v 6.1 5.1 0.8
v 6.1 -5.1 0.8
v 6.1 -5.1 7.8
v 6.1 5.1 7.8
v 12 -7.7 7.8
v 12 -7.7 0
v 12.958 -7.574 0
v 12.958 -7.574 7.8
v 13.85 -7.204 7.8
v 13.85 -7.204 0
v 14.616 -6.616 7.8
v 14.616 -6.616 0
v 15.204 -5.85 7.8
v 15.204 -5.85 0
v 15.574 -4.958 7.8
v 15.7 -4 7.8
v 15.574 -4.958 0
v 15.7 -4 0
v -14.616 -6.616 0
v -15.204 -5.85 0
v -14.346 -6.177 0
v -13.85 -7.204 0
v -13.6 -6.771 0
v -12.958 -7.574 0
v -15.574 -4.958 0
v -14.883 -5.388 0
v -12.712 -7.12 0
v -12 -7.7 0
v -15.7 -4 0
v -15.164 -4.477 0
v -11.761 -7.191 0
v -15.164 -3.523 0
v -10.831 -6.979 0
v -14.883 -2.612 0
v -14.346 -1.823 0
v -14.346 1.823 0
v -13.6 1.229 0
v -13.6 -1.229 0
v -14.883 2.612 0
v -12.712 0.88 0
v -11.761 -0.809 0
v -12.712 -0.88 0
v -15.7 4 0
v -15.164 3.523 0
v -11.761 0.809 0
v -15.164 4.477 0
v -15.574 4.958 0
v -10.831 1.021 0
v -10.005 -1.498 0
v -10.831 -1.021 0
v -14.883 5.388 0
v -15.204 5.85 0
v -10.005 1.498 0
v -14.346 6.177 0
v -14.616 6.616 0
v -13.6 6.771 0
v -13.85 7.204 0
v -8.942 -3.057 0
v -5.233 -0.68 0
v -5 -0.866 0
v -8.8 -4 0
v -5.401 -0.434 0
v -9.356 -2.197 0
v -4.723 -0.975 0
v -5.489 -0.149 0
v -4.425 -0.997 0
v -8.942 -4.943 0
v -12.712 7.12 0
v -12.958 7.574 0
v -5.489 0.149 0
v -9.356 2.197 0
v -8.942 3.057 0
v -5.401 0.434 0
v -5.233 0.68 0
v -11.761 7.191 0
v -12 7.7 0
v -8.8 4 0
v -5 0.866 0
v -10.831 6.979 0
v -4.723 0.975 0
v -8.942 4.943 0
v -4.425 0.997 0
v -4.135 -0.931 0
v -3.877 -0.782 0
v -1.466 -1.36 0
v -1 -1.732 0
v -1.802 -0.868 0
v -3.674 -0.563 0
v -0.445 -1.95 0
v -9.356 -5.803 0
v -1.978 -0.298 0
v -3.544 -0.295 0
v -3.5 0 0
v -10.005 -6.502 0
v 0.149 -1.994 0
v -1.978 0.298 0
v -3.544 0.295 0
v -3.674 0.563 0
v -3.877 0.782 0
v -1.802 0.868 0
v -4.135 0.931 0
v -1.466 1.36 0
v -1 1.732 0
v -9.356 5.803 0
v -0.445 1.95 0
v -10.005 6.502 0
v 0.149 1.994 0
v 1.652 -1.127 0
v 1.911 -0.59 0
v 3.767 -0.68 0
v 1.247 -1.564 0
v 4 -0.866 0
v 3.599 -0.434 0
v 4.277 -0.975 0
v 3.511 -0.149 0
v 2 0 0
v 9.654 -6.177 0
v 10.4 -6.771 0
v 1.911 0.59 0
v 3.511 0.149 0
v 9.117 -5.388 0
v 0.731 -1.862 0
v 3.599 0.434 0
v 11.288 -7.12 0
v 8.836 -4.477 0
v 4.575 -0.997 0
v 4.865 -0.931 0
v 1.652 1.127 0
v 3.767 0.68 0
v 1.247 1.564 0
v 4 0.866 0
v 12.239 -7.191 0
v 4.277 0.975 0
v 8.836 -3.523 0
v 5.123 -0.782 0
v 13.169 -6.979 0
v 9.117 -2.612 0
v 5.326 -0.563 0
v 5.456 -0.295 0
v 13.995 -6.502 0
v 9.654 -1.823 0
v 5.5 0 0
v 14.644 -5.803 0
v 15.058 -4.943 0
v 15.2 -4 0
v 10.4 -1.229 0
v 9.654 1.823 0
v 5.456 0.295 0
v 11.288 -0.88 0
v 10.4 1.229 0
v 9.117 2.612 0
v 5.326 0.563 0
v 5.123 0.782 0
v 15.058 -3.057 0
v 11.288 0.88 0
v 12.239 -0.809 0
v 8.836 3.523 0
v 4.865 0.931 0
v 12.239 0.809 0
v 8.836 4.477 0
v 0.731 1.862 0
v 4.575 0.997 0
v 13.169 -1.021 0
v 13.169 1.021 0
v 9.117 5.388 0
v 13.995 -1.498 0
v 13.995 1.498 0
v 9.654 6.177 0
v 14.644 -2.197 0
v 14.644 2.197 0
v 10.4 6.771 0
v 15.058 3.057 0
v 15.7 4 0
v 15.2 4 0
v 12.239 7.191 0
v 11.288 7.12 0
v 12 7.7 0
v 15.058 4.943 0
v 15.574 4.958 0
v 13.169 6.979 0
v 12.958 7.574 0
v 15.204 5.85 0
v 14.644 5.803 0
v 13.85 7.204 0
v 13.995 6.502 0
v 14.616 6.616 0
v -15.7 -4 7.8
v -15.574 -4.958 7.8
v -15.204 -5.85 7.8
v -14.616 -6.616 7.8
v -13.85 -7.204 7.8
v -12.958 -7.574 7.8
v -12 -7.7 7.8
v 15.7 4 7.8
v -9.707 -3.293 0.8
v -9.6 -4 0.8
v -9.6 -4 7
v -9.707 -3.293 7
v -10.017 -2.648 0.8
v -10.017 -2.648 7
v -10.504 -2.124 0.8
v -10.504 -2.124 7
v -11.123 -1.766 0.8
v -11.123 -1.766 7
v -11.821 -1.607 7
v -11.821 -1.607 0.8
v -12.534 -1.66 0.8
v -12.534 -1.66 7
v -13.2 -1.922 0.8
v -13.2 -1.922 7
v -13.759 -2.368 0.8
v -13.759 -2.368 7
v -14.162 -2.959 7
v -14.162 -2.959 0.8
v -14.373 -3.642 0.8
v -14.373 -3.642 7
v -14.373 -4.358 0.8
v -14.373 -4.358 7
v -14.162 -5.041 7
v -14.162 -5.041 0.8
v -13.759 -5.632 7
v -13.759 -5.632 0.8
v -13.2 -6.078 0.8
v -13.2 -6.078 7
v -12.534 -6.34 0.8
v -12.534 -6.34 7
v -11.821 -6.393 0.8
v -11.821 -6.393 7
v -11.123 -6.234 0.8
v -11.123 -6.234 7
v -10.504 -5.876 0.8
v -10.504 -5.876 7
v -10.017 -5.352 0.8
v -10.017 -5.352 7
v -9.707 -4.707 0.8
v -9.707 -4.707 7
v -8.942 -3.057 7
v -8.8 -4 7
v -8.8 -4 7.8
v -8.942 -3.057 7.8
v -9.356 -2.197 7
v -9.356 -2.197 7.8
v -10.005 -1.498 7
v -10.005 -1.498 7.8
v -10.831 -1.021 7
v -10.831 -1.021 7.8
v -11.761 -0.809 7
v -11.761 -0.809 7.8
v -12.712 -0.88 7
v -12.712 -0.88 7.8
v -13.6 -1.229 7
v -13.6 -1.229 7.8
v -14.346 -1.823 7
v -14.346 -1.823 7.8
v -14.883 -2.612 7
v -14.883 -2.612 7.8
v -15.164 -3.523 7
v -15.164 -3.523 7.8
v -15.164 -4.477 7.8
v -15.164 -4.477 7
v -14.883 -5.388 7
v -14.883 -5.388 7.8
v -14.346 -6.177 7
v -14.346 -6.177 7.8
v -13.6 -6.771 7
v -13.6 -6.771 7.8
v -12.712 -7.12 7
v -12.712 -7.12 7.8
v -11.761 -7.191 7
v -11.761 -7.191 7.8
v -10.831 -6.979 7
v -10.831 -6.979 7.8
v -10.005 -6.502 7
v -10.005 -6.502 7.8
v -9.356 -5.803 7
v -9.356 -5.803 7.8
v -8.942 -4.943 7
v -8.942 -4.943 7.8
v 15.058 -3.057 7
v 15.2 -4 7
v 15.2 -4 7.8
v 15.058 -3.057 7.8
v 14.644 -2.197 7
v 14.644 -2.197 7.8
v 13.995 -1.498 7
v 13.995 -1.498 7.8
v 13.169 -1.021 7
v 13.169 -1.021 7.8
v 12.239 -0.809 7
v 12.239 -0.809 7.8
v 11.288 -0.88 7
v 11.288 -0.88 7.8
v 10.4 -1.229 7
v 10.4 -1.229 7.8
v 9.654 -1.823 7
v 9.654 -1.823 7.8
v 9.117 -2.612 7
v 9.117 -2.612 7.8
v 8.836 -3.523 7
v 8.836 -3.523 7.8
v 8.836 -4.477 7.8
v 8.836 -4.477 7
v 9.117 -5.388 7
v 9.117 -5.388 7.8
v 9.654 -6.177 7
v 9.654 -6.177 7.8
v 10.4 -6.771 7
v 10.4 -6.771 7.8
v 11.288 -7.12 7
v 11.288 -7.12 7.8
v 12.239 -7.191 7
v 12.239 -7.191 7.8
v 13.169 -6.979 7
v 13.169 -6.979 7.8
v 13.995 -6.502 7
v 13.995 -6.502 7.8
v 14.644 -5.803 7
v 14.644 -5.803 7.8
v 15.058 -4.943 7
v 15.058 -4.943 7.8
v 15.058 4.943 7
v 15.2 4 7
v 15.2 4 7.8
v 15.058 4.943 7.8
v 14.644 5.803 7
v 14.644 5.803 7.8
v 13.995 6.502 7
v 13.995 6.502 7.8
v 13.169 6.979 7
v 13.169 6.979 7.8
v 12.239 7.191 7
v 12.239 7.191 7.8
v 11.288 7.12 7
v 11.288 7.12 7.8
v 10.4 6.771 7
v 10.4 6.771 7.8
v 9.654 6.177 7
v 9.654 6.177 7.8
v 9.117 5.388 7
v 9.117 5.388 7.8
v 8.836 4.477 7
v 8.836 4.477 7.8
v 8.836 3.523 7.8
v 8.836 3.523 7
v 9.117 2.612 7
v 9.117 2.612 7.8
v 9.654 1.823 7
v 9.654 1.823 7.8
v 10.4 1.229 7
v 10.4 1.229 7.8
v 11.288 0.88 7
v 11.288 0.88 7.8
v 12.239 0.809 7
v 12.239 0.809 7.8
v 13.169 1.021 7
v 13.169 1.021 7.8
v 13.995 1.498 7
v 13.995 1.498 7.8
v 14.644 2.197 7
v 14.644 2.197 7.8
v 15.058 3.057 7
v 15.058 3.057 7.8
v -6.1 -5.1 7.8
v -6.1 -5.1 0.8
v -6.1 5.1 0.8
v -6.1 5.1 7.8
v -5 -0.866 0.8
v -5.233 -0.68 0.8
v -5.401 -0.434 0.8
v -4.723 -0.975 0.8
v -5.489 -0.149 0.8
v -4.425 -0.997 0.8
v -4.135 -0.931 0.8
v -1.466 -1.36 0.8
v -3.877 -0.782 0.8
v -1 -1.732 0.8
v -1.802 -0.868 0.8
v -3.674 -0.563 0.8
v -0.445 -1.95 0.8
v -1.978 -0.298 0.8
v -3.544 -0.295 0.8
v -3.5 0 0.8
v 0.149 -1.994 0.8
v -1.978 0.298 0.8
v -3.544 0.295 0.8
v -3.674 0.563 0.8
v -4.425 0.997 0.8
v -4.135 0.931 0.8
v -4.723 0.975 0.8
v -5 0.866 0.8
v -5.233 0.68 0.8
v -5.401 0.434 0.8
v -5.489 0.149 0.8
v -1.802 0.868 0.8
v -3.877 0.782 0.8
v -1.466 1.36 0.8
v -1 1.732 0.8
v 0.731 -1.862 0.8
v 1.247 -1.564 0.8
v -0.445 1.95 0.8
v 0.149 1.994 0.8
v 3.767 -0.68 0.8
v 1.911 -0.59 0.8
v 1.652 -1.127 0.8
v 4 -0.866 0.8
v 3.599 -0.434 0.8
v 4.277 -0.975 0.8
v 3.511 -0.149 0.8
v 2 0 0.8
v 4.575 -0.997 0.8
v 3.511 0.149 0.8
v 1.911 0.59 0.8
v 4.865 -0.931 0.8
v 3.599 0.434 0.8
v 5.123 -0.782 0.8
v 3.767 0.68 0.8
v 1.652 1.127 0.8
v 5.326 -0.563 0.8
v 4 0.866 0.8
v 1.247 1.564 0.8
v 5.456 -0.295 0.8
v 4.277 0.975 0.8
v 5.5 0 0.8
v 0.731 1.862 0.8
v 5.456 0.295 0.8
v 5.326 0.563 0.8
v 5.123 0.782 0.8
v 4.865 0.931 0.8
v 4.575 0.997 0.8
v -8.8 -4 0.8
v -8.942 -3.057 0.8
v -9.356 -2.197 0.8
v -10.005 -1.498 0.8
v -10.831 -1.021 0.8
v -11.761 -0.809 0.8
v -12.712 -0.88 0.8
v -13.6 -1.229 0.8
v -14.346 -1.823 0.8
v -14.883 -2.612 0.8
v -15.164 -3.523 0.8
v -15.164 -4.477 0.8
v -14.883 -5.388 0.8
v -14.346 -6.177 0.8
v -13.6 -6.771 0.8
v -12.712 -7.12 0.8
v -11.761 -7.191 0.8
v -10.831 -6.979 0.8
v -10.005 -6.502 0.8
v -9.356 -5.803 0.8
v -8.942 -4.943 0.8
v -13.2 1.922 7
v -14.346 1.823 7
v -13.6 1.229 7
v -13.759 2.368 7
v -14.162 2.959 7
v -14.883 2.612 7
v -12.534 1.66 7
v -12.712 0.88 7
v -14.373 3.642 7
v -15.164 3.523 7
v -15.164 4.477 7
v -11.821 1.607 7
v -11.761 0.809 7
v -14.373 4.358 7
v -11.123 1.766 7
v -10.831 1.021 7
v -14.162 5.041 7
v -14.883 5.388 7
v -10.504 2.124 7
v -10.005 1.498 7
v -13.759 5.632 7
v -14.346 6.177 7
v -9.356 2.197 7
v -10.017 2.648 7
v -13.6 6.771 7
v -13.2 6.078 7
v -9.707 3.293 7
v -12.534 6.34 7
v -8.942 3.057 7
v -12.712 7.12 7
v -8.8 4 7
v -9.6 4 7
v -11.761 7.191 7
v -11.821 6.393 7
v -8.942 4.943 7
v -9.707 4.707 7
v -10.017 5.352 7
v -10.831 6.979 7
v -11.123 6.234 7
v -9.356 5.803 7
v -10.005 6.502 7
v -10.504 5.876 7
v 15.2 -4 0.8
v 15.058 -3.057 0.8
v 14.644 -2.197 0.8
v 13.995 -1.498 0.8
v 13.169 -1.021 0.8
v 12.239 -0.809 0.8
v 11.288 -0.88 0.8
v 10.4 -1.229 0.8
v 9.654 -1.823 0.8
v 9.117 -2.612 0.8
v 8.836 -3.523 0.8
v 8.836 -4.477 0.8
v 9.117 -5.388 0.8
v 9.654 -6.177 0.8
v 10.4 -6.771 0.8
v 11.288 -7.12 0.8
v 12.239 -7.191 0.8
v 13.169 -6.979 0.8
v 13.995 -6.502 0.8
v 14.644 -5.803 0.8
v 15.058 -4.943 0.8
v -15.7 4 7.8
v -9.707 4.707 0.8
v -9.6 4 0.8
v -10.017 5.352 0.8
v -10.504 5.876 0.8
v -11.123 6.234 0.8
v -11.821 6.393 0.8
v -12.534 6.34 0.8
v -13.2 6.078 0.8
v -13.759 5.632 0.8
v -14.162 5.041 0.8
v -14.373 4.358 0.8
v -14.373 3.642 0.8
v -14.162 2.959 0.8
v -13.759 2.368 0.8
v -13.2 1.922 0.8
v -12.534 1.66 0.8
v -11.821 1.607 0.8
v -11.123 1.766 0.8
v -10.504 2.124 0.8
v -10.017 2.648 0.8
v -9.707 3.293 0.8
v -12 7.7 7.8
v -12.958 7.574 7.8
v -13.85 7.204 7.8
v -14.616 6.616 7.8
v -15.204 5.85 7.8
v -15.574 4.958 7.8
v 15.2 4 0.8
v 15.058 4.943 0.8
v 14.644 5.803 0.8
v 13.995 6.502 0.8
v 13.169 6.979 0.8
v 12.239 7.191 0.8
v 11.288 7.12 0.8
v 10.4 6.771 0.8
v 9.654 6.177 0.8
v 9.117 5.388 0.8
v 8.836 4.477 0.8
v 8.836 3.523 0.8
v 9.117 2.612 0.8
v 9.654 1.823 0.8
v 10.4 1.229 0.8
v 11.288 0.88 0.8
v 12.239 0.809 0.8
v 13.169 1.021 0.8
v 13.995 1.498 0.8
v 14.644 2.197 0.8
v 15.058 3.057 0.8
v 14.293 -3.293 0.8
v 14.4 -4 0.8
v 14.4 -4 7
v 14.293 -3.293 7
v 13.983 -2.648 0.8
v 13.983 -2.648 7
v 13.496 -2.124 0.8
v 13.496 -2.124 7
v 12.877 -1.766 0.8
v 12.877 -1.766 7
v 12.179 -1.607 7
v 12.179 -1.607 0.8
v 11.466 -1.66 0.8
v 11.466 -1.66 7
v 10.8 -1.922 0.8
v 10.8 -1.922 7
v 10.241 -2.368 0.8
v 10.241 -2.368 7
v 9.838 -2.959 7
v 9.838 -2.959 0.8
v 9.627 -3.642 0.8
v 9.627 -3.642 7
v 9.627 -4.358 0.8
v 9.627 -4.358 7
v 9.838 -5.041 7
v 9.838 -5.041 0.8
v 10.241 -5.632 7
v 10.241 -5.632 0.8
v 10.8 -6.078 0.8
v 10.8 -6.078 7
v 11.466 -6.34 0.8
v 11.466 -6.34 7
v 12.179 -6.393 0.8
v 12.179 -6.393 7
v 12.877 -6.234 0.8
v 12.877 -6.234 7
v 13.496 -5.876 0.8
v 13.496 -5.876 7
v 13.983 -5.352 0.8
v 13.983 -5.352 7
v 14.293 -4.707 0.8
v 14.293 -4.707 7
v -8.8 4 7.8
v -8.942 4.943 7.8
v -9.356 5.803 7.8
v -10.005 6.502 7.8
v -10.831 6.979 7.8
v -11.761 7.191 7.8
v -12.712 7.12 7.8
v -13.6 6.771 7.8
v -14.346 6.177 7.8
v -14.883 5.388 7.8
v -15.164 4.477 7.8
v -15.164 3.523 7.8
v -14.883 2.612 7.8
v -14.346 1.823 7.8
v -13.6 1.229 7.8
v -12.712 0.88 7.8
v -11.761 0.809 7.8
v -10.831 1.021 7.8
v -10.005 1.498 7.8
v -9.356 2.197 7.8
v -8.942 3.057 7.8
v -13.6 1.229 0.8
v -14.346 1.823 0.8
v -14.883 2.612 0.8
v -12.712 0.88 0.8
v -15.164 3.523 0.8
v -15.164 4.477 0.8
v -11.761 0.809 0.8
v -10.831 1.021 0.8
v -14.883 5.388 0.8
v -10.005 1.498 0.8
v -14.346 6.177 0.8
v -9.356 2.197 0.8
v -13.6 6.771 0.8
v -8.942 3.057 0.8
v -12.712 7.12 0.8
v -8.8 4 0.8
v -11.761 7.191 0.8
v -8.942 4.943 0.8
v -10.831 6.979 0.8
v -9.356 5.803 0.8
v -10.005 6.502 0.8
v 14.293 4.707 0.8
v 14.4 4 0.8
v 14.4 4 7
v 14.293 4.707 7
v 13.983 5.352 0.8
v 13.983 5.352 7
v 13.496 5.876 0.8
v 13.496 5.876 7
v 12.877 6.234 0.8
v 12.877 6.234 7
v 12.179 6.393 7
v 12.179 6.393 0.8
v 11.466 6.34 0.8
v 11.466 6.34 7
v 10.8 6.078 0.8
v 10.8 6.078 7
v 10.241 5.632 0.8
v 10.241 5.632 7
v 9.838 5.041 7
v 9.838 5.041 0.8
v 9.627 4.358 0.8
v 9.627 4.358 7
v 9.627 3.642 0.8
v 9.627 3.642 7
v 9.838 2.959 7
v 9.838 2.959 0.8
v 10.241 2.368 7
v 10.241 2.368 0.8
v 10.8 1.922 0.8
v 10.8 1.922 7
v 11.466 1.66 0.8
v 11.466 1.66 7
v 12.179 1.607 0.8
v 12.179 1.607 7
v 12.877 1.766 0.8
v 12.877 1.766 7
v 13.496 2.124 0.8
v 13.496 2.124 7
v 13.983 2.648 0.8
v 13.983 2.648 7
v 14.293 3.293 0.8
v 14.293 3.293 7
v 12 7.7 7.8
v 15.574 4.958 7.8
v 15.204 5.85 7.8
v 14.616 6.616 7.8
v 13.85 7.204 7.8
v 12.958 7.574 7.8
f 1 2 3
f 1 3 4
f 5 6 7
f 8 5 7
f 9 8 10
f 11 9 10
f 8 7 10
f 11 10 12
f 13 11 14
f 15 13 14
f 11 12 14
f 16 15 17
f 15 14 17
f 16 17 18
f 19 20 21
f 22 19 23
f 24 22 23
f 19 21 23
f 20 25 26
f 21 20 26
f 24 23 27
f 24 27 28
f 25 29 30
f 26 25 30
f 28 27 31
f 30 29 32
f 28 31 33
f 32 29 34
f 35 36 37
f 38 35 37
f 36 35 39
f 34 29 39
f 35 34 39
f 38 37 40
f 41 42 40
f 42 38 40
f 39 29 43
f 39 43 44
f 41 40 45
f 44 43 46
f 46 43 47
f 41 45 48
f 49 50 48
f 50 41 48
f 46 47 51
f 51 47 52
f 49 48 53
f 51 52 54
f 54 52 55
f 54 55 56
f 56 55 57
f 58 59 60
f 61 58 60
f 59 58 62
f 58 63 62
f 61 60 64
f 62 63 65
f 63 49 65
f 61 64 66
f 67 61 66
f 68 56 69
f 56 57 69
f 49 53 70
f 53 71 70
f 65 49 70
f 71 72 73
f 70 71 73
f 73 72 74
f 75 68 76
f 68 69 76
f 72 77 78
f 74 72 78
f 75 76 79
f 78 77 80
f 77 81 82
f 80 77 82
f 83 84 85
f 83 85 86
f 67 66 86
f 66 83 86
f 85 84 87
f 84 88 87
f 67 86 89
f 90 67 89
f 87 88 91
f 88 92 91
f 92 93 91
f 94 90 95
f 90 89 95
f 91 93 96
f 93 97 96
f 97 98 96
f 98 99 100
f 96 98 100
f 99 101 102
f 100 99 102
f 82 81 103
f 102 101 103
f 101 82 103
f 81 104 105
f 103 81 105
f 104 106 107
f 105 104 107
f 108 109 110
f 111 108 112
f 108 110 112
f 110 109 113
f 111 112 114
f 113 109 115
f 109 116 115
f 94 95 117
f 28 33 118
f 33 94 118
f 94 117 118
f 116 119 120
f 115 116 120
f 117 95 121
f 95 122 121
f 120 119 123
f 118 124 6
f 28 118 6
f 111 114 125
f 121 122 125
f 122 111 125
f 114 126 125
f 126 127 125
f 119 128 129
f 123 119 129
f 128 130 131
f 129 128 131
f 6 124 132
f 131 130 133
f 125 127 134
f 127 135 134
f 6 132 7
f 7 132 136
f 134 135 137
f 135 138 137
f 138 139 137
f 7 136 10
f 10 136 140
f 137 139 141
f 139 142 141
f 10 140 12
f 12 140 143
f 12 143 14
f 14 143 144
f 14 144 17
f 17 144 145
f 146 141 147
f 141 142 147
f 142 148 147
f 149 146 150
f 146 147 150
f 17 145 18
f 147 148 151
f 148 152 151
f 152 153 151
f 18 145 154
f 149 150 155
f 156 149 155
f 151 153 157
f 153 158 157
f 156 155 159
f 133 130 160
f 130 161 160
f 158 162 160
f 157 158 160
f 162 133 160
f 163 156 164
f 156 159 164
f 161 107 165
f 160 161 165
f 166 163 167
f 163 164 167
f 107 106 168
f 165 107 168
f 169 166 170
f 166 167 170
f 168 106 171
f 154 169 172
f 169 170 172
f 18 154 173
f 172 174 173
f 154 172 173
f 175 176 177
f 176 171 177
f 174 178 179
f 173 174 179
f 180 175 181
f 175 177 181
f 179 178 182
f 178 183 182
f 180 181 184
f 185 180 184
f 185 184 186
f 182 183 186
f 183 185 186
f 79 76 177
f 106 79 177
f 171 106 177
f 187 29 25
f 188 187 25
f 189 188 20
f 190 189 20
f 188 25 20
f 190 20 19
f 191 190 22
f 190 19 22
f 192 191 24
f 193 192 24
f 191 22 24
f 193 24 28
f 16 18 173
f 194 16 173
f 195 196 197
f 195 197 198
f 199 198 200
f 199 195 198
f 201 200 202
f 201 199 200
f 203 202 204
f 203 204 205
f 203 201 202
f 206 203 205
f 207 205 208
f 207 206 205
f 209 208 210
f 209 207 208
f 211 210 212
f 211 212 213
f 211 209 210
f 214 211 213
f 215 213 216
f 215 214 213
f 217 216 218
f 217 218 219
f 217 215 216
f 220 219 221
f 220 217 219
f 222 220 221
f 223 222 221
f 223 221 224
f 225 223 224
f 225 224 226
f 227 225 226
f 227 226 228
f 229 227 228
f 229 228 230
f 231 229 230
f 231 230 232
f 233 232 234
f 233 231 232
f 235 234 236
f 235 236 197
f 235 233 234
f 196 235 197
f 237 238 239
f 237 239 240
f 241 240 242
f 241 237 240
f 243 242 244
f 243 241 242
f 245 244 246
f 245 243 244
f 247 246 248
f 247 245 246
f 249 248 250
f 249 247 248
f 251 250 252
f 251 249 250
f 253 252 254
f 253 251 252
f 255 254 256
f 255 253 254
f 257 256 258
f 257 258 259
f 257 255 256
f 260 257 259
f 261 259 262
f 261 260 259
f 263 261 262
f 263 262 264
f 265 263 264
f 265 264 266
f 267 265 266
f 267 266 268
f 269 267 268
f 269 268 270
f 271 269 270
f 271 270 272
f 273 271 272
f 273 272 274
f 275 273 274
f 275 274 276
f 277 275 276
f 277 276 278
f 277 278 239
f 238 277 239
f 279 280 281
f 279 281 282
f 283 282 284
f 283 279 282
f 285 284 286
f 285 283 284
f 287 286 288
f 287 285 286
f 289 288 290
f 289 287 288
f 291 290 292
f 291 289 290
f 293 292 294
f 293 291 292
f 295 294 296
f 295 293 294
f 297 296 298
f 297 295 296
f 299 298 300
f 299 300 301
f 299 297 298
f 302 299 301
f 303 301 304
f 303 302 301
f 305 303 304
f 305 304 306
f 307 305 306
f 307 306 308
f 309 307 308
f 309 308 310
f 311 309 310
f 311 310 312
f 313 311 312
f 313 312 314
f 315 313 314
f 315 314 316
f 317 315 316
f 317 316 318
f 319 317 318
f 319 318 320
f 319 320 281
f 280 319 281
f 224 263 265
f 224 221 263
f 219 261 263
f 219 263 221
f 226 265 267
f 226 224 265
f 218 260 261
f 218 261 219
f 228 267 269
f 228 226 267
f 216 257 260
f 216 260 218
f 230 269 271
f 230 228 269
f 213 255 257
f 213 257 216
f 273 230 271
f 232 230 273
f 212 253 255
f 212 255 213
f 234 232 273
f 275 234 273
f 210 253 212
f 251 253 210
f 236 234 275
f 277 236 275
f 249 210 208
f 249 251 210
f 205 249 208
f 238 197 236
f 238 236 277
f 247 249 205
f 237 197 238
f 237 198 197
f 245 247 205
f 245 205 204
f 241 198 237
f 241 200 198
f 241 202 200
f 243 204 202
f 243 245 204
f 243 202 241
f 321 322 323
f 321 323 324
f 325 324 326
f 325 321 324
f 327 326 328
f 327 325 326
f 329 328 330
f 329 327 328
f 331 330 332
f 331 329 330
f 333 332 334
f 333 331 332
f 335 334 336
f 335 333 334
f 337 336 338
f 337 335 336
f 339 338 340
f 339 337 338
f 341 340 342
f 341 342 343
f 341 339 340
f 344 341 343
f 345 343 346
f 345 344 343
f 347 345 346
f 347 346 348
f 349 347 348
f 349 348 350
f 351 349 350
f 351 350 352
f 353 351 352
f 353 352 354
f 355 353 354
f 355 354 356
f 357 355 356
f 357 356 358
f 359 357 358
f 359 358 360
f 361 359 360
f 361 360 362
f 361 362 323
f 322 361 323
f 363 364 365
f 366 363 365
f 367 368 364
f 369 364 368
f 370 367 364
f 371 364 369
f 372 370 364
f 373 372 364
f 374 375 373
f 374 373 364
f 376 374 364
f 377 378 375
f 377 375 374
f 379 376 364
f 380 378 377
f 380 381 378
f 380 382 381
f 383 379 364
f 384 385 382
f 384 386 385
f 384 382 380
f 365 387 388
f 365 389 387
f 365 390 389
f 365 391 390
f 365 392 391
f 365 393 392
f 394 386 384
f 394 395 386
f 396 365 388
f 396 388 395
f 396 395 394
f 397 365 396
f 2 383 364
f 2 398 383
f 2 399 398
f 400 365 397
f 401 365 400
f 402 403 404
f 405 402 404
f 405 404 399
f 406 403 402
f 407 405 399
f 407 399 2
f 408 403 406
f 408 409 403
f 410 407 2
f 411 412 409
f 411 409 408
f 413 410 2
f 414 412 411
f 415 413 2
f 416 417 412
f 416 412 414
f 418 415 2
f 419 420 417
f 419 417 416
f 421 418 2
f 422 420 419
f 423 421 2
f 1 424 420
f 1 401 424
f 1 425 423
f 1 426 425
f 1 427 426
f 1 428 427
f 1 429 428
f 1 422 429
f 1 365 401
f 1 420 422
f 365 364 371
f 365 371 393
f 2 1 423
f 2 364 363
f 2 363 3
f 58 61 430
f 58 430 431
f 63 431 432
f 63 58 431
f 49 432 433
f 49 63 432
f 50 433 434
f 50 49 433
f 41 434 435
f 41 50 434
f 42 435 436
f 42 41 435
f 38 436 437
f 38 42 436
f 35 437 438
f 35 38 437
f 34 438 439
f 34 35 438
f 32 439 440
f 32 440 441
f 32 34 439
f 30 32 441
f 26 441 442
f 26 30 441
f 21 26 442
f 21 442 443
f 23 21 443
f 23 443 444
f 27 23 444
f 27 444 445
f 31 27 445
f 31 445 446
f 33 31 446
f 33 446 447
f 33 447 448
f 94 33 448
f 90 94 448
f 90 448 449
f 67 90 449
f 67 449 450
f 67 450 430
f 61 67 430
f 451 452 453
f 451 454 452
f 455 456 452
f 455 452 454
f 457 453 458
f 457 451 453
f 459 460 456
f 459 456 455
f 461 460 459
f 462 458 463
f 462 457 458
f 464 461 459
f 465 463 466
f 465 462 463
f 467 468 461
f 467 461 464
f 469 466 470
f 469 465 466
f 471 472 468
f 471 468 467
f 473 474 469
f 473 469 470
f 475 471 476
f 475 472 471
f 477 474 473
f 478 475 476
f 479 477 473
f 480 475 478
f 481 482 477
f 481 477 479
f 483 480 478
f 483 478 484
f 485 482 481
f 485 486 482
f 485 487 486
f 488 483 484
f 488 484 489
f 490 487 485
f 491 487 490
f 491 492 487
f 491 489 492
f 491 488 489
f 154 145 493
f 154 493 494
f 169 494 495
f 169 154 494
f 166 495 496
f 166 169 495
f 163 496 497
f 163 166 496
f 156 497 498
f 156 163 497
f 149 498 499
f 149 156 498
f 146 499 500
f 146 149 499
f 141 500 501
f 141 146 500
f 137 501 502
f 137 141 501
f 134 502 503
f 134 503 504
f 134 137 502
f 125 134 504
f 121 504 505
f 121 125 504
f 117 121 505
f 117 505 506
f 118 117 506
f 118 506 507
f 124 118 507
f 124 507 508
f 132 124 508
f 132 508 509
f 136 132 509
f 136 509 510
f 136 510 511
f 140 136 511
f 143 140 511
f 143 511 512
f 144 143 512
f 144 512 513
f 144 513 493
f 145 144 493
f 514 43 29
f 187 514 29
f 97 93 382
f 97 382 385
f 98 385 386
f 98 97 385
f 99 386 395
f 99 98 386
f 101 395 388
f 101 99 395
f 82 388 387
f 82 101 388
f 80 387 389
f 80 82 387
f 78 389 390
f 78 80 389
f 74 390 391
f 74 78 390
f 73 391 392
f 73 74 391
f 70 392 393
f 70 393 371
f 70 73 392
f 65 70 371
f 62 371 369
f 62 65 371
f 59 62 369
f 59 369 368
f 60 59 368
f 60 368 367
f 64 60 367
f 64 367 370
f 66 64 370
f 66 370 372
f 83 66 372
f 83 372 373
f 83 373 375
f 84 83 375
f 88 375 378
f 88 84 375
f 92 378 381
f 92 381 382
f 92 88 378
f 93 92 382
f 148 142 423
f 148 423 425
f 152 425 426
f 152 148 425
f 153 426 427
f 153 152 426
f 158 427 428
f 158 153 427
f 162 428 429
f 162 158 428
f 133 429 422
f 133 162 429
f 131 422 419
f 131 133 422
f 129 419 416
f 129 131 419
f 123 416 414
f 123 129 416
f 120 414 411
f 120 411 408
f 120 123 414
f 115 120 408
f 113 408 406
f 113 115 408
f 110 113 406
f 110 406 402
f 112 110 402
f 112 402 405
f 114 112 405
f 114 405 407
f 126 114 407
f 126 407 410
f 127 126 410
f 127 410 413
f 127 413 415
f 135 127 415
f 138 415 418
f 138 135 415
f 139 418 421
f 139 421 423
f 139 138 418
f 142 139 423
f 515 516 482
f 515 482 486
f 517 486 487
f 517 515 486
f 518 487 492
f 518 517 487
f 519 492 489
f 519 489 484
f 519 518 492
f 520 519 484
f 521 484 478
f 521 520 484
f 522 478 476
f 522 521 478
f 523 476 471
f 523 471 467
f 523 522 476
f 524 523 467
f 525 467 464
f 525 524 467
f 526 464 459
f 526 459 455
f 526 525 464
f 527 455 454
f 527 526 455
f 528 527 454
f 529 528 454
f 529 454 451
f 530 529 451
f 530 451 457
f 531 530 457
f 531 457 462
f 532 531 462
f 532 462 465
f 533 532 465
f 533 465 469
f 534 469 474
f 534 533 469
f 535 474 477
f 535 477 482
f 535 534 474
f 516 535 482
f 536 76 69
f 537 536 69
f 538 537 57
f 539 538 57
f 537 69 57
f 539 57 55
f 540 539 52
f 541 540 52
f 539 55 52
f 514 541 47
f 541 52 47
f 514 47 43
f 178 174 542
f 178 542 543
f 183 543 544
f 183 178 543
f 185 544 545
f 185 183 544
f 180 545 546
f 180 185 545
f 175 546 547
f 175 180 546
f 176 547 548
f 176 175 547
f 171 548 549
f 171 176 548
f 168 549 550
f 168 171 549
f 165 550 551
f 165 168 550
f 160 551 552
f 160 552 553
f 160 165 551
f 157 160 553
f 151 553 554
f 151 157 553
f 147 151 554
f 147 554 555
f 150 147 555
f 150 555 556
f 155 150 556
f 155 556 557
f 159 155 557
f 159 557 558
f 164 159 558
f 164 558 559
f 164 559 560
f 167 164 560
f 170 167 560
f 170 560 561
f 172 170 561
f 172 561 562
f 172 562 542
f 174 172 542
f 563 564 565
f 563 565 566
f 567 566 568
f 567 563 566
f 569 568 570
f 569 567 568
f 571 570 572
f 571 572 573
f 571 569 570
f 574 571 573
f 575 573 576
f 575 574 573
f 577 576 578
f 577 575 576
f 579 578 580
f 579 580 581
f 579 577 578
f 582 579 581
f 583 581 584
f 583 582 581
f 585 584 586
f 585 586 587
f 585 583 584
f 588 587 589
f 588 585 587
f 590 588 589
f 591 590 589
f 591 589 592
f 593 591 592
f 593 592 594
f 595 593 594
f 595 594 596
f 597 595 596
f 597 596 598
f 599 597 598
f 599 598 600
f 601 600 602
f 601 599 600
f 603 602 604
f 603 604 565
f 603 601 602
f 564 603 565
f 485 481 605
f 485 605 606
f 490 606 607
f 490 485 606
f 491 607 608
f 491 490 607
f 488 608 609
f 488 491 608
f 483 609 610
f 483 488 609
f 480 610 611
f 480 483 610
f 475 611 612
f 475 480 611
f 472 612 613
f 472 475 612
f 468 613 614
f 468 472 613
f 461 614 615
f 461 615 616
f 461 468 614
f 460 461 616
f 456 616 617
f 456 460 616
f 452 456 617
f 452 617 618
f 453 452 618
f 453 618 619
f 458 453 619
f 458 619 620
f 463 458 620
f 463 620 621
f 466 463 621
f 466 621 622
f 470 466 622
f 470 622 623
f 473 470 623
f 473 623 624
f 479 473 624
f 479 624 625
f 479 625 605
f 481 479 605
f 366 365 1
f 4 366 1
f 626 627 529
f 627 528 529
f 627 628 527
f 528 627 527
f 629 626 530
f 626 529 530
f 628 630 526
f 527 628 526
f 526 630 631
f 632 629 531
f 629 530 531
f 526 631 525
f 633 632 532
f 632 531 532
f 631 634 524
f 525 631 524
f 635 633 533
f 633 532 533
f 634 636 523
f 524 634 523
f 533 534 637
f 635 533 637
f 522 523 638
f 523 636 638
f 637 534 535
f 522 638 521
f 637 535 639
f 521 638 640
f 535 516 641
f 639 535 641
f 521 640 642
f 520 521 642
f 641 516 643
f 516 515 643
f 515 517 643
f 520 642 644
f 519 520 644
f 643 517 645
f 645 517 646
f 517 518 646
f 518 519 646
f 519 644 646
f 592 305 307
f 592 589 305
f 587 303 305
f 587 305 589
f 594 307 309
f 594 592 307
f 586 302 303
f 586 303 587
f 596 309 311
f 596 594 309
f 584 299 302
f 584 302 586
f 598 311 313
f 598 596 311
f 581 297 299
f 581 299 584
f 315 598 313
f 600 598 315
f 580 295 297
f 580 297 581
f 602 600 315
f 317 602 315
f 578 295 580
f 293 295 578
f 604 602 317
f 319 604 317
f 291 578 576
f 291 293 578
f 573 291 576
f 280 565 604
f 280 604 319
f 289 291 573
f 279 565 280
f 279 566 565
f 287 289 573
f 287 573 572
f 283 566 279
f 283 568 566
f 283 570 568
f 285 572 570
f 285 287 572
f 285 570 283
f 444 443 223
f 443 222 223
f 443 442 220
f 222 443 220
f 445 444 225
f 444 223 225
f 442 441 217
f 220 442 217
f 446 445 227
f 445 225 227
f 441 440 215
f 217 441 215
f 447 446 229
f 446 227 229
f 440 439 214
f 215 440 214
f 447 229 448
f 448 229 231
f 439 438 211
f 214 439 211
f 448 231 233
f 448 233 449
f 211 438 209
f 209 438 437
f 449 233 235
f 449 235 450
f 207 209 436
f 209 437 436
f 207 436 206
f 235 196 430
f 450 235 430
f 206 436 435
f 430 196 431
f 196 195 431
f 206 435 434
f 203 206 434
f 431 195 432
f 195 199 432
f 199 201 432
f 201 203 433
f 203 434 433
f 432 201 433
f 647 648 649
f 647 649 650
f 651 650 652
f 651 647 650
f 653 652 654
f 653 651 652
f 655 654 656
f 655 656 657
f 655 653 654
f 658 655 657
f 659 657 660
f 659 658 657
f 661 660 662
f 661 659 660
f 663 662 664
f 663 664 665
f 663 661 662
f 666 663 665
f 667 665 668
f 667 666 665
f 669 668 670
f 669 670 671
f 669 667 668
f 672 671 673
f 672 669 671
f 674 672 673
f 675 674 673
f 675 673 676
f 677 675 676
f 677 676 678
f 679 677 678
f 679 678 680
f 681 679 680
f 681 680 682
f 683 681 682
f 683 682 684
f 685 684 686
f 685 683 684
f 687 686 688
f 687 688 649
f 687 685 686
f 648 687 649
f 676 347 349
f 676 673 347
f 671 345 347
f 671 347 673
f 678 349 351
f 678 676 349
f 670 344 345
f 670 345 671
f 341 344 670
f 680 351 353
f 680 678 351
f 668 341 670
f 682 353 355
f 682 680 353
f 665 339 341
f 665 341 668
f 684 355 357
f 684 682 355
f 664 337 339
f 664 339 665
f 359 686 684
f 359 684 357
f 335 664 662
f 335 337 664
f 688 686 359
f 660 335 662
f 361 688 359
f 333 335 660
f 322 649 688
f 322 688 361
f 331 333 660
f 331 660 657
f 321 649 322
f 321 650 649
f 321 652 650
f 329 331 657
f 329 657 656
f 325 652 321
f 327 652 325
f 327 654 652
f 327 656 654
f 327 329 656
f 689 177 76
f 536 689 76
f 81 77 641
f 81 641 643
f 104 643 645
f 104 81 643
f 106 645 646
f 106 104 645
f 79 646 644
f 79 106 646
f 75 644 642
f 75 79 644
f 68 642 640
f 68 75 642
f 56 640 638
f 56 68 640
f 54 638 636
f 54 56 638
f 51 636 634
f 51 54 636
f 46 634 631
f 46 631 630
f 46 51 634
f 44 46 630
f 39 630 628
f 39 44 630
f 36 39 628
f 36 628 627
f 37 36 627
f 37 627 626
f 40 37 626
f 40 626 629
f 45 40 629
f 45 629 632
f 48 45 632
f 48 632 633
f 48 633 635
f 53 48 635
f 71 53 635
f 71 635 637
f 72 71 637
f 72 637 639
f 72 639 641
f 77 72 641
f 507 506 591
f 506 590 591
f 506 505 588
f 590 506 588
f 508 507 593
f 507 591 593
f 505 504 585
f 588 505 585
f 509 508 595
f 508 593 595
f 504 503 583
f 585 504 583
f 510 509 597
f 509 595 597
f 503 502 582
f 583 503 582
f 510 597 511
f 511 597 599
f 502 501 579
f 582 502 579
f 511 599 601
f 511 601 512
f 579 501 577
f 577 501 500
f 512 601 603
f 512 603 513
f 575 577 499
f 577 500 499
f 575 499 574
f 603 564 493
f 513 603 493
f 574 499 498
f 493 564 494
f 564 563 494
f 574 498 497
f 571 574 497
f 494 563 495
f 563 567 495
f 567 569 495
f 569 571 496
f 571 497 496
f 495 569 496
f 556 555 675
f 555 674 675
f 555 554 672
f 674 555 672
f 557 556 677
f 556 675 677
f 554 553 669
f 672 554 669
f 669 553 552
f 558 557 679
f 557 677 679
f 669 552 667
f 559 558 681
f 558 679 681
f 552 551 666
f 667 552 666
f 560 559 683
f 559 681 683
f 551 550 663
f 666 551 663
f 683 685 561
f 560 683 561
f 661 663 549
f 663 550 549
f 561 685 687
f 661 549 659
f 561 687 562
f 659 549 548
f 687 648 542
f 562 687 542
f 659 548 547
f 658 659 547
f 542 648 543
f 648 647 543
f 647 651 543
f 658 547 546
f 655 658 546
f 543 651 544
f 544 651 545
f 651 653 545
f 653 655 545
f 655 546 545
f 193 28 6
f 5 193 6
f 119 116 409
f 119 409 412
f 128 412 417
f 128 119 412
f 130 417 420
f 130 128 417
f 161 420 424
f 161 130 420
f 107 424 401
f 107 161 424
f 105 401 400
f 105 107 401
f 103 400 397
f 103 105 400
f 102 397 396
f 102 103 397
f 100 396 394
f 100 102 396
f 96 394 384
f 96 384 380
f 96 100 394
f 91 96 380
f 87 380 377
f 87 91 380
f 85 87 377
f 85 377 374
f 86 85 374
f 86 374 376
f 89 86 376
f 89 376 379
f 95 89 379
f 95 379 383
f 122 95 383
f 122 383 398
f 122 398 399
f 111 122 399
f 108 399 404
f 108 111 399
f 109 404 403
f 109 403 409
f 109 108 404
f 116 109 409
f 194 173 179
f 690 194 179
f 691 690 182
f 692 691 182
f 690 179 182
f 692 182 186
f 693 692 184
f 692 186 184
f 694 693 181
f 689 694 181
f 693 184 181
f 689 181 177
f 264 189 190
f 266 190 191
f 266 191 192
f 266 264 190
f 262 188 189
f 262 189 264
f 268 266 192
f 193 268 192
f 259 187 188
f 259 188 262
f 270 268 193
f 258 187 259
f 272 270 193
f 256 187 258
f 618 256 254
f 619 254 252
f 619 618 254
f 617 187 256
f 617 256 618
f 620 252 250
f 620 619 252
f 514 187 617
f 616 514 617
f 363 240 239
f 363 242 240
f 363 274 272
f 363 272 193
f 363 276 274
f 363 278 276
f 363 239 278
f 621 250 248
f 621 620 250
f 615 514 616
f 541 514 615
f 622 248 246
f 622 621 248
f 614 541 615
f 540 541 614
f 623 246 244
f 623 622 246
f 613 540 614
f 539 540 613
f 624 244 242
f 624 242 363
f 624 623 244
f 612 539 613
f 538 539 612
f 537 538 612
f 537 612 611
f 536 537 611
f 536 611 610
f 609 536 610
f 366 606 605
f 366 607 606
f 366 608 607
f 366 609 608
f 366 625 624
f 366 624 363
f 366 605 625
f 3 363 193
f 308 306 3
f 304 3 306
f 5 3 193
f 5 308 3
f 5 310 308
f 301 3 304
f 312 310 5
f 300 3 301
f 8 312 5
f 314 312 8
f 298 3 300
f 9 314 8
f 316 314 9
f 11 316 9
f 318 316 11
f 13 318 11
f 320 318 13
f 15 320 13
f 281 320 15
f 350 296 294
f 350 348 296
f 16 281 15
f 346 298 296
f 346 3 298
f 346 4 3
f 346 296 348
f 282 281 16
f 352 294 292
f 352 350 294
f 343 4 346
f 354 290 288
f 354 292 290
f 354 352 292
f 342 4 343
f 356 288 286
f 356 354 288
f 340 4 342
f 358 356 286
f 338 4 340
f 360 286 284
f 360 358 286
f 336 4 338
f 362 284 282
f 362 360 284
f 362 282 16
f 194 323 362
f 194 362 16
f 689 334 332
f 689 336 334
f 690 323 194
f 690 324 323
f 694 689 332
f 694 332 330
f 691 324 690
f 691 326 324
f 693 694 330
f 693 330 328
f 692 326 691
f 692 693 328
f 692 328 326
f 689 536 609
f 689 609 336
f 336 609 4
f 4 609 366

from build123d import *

# Parameters (mm, degrees)
F0_R     = 3.2
F0_W     = 12.2
F0_H     = 10.2
F1_DEPTH = 7.8
F2_START = 0.8
F0_R_2   = 2.4
F2_DEPTH = 6.2
F0_R_3   = 1
F0_R_4   = 2
F3_DEPTH = 0.8


with BuildPart() as f1:
    # F0 (on Top) → F1 (new body)
    with BuildSketch(Plane.XY):
        with BuildLine():
            Line((12, 7.7), (-12, 7.7))
            ThreePointArc((-12, 7.7), (-14.6162950904, 6.6162950904), (-15.7, 4))
            Line((-15.7, 4), (-15.7, -4))
            ThreePointArc((-15.7, -4), (-14.6162950904, -6.6162950904), (-12, -7.7))
            Line((-12, -7.7), (12, -7.7))
            ThreePointArc((12, -7.7), (14.6162950904, -6.6162950904), (15.7, -4))
            Line((15.7, -4), (15.7, 4))
            ThreePointArc((15.7, 4), (14.6162950904, 6.6162950904), (12, 7.7))
        make_face()
        with Locations((-12, -4)):
            Circle(F0_R, mode=Mode.SUBTRACT)
        with Locations((12, -4)):
            Circle(F0_R, mode=Mode.SUBTRACT)
        with Locations((-12, 4)):
            Circle(F0_R, mode=Mode.SUBTRACT)
        Rectangle(F0_W, F0_H, mode=Mode.SUBTRACT)
        with Locations((12, 4)):
            Circle(F0_R, mode=Mode.SUBTRACT)
    extrude(amount=F1_DEPTH)

    # F0 (on Top) → F2 (join)
    with BuildSketch(Plane.XY.offset(F2_START)):
        with Locations((-12, -4)):
            Circle(F0_R)
        with Locations((-12, -4)):
            Circle(F0_R_2, mode=Mode.SUBTRACT)
        with Locations((12, -4)):
            Circle(F0_R)
        with Locations((12, -4)):
            Circle(F0_R_2, mode=Mode.SUBTRACT)
        with Locations((-12, 4)):
            Circle(F0_R)
        with Locations((-12, 4)):
            Circle(F0_R_2, mode=Mode.SUBTRACT)
        with Locations((12, 4)):
            Circle(F0_R)
        with Locations((12, 4)):
            Circle(F0_R_2, mode=Mode.SUBTRACT)
    extrude(amount=F2_DEPTH)

    # F0 (on Top) → F3 (join)
    with BuildSketch(Plane.XY):
        Rectangle(F0_W, F0_H)
        with Locations((-4.5, 0)):
            Circle(F0_R_3, mode=Mode.SUBTRACT)
        Circle(F0_R_4, mode=Mode.SUBTRACT)
        with Locations((4.5, 0)):
            Circle(F0_R_3, mode=Mode.SUBTRACT)
    extrude(amount=F3_DEPTH)


solid = f1.part
